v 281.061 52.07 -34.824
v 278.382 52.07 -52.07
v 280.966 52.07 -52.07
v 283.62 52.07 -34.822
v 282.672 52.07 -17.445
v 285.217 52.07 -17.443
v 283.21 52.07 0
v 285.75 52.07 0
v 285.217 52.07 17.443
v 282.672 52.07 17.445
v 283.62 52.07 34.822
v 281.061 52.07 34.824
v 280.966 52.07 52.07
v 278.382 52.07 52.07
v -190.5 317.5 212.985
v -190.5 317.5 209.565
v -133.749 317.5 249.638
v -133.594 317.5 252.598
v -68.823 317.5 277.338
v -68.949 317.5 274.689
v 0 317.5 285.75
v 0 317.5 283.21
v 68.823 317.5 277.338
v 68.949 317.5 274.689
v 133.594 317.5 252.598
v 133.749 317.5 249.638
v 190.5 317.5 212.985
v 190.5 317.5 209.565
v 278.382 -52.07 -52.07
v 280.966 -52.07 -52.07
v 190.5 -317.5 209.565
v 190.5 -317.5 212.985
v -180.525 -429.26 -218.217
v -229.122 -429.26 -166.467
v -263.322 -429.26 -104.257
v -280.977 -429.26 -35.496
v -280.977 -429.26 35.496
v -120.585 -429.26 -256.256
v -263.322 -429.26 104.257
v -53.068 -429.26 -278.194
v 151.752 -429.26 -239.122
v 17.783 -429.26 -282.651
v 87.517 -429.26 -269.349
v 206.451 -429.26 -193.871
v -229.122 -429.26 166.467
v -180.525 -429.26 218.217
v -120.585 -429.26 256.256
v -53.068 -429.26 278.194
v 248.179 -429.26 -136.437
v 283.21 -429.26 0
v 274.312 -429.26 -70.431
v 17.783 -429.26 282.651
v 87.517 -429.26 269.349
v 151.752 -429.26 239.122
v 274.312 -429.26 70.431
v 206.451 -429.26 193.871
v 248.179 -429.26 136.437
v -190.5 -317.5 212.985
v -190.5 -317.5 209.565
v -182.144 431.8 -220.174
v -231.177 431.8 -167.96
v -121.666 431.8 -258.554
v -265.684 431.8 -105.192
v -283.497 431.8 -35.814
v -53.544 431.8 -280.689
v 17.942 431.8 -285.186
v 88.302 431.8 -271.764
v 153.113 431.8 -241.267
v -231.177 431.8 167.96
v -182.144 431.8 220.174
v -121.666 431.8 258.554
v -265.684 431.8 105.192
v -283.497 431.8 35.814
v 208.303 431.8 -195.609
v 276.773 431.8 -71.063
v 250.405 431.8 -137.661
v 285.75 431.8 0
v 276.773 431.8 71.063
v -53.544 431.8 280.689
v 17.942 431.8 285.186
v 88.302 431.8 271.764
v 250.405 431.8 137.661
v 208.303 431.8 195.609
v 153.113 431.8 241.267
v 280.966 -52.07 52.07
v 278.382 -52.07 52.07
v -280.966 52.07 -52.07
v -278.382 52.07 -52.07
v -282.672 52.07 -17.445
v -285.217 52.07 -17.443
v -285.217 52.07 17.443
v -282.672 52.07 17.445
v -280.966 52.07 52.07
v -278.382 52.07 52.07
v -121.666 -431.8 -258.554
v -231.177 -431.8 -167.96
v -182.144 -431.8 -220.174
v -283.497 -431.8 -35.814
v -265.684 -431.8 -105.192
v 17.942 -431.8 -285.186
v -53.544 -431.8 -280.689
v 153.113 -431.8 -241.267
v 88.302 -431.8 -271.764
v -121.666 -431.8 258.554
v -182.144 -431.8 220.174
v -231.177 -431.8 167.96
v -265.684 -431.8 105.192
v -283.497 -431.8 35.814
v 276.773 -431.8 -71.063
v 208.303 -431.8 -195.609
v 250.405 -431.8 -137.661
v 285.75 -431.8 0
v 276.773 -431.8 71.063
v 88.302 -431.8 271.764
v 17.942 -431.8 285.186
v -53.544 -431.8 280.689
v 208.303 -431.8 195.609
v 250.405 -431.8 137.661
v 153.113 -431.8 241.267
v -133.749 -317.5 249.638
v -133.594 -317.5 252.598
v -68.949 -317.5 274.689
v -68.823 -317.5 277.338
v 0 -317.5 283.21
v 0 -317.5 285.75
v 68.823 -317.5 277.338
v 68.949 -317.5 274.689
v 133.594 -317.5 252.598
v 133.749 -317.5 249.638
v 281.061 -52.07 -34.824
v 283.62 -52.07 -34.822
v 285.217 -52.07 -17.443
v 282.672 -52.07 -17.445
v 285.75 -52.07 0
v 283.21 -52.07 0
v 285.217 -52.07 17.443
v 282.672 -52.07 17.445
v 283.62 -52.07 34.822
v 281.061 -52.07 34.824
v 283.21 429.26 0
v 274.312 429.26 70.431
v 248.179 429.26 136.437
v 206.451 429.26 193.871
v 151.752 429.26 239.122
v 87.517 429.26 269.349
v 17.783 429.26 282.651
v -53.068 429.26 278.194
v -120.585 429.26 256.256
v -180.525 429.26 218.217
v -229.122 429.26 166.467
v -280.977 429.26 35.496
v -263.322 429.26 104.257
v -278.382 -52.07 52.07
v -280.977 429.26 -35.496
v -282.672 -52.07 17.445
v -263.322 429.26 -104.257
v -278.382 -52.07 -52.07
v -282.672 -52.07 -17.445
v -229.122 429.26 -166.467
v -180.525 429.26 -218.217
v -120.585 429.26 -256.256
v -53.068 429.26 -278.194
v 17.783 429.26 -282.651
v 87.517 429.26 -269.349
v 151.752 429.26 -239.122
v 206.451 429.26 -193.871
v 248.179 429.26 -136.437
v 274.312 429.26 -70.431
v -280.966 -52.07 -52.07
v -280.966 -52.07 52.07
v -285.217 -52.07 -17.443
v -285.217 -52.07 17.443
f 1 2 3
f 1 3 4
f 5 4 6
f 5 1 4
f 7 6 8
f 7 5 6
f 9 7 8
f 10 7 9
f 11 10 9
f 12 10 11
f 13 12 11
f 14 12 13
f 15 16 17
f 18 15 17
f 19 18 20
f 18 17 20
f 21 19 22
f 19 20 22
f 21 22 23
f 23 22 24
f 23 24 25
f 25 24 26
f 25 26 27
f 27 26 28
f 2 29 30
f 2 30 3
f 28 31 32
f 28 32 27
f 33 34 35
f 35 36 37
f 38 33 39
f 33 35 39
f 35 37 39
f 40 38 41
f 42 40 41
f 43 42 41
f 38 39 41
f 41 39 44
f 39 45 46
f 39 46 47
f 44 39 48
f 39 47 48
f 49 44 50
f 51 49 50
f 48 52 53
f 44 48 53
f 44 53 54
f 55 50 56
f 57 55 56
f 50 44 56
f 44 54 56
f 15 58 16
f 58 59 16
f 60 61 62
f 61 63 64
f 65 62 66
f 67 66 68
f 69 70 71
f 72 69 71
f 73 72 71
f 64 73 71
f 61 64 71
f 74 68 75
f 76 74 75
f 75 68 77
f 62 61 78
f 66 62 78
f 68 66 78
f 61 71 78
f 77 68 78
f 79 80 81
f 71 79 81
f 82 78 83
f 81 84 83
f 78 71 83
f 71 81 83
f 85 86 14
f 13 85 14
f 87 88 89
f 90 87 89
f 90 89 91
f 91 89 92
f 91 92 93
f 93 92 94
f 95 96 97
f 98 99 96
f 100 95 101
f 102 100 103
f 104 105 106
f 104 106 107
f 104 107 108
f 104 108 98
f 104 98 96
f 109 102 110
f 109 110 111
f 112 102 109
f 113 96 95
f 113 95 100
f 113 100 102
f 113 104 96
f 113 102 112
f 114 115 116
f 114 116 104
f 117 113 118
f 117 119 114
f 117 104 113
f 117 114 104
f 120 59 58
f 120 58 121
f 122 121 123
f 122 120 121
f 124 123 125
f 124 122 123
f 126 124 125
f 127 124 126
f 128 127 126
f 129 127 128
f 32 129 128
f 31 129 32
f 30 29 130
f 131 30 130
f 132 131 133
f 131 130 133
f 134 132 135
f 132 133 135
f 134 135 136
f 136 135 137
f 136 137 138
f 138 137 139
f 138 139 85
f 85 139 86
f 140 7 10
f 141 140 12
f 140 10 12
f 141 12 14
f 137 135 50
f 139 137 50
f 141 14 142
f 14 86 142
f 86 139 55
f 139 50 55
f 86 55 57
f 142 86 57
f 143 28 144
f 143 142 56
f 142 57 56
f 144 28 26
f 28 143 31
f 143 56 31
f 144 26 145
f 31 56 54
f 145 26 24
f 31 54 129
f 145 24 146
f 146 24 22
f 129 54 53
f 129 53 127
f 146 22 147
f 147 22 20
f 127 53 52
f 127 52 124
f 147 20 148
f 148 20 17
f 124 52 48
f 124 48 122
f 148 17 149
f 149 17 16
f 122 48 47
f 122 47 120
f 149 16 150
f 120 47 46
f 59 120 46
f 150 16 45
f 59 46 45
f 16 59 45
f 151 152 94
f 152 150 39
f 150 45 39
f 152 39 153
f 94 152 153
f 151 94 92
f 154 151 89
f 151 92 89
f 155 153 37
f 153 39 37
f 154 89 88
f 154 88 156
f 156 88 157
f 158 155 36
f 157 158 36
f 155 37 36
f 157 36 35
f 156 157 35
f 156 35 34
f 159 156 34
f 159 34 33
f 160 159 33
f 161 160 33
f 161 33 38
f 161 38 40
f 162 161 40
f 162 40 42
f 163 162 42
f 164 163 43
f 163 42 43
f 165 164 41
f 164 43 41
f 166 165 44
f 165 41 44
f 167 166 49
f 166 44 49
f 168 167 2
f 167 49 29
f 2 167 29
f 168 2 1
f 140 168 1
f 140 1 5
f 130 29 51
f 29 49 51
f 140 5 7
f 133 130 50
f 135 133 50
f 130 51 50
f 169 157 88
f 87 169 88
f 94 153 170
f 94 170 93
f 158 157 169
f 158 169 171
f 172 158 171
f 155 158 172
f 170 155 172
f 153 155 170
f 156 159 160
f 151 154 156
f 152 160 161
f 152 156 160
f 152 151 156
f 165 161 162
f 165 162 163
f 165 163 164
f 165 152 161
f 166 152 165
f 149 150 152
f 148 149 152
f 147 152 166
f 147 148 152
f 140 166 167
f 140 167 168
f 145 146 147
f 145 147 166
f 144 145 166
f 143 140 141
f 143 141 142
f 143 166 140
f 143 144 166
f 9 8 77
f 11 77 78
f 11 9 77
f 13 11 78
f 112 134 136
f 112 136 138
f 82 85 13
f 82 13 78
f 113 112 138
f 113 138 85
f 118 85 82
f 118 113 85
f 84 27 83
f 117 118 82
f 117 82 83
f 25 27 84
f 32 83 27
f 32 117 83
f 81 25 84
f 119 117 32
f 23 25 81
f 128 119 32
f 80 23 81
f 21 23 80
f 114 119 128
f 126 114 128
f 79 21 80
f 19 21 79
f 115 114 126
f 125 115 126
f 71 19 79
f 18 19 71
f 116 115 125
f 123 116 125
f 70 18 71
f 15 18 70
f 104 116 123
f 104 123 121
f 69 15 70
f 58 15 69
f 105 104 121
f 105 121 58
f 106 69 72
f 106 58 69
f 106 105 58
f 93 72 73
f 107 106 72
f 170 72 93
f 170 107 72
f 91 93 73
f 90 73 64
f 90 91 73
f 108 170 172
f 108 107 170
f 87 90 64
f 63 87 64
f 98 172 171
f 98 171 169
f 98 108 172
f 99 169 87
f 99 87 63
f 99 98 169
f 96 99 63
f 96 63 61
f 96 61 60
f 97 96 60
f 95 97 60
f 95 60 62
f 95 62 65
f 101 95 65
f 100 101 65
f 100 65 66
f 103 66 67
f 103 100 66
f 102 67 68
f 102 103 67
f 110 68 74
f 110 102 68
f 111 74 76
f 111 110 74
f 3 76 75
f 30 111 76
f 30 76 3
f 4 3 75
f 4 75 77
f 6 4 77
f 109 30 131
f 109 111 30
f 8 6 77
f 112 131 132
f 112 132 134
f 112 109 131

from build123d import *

# Parameters (mm, degrees)
F0_R          = 285.75
F1_DEPTH      = 431.8
F2_W          = 381
F2_H          = 635
F3_DEPTH      = 452.12
F4_T          = -2.54
F5_W          = 104.14
F5_H          = 104.14
F6_DEPTH      = 285.751
F6_DEPTH_BACK = 285.751


with BuildPart() as f1:
    # F0 (on Front) → F1 (new body, symmetric)
    with BuildSketch(Plane.XZ):
        Circle(F0_R)
    extrude(amount=F1_DEPTH, both=True)

    # F2 (on Top) → F3 (cut)
    with BuildSketch(Plane.XY):
        Rectangle(F2_W, F2_H)
    extrude(amount=F3_DEPTH, mode=Mode.SUBTRACT)

    # F4
    f4_openings = [f1.faces().sort_by_distance(p)[0] for p in [
        (0, 317.5, 132.295443),
        (-190.5, 0, 106.492737),
        (0, 0, 0),
        (0, -317.5, 132.295443),
        (190.5, 0, 106.492737),
    ]]
    offset(amount=F4_T, openings=f4_openings)

    # F5 (on Right) → F6 (cut, two sides)
    with BuildSketch(Plane.YZ) as f6_sk:
        Rectangle(F5_W, F5_H)
    extrude(amount=-F6_DEPTH, mode=Mode.SUBTRACT)
    extrude(f6_sk.sketch, amount=F6_DEPTH_BACK, mode=Mode.SUBTRACT)


solid = f1.part
